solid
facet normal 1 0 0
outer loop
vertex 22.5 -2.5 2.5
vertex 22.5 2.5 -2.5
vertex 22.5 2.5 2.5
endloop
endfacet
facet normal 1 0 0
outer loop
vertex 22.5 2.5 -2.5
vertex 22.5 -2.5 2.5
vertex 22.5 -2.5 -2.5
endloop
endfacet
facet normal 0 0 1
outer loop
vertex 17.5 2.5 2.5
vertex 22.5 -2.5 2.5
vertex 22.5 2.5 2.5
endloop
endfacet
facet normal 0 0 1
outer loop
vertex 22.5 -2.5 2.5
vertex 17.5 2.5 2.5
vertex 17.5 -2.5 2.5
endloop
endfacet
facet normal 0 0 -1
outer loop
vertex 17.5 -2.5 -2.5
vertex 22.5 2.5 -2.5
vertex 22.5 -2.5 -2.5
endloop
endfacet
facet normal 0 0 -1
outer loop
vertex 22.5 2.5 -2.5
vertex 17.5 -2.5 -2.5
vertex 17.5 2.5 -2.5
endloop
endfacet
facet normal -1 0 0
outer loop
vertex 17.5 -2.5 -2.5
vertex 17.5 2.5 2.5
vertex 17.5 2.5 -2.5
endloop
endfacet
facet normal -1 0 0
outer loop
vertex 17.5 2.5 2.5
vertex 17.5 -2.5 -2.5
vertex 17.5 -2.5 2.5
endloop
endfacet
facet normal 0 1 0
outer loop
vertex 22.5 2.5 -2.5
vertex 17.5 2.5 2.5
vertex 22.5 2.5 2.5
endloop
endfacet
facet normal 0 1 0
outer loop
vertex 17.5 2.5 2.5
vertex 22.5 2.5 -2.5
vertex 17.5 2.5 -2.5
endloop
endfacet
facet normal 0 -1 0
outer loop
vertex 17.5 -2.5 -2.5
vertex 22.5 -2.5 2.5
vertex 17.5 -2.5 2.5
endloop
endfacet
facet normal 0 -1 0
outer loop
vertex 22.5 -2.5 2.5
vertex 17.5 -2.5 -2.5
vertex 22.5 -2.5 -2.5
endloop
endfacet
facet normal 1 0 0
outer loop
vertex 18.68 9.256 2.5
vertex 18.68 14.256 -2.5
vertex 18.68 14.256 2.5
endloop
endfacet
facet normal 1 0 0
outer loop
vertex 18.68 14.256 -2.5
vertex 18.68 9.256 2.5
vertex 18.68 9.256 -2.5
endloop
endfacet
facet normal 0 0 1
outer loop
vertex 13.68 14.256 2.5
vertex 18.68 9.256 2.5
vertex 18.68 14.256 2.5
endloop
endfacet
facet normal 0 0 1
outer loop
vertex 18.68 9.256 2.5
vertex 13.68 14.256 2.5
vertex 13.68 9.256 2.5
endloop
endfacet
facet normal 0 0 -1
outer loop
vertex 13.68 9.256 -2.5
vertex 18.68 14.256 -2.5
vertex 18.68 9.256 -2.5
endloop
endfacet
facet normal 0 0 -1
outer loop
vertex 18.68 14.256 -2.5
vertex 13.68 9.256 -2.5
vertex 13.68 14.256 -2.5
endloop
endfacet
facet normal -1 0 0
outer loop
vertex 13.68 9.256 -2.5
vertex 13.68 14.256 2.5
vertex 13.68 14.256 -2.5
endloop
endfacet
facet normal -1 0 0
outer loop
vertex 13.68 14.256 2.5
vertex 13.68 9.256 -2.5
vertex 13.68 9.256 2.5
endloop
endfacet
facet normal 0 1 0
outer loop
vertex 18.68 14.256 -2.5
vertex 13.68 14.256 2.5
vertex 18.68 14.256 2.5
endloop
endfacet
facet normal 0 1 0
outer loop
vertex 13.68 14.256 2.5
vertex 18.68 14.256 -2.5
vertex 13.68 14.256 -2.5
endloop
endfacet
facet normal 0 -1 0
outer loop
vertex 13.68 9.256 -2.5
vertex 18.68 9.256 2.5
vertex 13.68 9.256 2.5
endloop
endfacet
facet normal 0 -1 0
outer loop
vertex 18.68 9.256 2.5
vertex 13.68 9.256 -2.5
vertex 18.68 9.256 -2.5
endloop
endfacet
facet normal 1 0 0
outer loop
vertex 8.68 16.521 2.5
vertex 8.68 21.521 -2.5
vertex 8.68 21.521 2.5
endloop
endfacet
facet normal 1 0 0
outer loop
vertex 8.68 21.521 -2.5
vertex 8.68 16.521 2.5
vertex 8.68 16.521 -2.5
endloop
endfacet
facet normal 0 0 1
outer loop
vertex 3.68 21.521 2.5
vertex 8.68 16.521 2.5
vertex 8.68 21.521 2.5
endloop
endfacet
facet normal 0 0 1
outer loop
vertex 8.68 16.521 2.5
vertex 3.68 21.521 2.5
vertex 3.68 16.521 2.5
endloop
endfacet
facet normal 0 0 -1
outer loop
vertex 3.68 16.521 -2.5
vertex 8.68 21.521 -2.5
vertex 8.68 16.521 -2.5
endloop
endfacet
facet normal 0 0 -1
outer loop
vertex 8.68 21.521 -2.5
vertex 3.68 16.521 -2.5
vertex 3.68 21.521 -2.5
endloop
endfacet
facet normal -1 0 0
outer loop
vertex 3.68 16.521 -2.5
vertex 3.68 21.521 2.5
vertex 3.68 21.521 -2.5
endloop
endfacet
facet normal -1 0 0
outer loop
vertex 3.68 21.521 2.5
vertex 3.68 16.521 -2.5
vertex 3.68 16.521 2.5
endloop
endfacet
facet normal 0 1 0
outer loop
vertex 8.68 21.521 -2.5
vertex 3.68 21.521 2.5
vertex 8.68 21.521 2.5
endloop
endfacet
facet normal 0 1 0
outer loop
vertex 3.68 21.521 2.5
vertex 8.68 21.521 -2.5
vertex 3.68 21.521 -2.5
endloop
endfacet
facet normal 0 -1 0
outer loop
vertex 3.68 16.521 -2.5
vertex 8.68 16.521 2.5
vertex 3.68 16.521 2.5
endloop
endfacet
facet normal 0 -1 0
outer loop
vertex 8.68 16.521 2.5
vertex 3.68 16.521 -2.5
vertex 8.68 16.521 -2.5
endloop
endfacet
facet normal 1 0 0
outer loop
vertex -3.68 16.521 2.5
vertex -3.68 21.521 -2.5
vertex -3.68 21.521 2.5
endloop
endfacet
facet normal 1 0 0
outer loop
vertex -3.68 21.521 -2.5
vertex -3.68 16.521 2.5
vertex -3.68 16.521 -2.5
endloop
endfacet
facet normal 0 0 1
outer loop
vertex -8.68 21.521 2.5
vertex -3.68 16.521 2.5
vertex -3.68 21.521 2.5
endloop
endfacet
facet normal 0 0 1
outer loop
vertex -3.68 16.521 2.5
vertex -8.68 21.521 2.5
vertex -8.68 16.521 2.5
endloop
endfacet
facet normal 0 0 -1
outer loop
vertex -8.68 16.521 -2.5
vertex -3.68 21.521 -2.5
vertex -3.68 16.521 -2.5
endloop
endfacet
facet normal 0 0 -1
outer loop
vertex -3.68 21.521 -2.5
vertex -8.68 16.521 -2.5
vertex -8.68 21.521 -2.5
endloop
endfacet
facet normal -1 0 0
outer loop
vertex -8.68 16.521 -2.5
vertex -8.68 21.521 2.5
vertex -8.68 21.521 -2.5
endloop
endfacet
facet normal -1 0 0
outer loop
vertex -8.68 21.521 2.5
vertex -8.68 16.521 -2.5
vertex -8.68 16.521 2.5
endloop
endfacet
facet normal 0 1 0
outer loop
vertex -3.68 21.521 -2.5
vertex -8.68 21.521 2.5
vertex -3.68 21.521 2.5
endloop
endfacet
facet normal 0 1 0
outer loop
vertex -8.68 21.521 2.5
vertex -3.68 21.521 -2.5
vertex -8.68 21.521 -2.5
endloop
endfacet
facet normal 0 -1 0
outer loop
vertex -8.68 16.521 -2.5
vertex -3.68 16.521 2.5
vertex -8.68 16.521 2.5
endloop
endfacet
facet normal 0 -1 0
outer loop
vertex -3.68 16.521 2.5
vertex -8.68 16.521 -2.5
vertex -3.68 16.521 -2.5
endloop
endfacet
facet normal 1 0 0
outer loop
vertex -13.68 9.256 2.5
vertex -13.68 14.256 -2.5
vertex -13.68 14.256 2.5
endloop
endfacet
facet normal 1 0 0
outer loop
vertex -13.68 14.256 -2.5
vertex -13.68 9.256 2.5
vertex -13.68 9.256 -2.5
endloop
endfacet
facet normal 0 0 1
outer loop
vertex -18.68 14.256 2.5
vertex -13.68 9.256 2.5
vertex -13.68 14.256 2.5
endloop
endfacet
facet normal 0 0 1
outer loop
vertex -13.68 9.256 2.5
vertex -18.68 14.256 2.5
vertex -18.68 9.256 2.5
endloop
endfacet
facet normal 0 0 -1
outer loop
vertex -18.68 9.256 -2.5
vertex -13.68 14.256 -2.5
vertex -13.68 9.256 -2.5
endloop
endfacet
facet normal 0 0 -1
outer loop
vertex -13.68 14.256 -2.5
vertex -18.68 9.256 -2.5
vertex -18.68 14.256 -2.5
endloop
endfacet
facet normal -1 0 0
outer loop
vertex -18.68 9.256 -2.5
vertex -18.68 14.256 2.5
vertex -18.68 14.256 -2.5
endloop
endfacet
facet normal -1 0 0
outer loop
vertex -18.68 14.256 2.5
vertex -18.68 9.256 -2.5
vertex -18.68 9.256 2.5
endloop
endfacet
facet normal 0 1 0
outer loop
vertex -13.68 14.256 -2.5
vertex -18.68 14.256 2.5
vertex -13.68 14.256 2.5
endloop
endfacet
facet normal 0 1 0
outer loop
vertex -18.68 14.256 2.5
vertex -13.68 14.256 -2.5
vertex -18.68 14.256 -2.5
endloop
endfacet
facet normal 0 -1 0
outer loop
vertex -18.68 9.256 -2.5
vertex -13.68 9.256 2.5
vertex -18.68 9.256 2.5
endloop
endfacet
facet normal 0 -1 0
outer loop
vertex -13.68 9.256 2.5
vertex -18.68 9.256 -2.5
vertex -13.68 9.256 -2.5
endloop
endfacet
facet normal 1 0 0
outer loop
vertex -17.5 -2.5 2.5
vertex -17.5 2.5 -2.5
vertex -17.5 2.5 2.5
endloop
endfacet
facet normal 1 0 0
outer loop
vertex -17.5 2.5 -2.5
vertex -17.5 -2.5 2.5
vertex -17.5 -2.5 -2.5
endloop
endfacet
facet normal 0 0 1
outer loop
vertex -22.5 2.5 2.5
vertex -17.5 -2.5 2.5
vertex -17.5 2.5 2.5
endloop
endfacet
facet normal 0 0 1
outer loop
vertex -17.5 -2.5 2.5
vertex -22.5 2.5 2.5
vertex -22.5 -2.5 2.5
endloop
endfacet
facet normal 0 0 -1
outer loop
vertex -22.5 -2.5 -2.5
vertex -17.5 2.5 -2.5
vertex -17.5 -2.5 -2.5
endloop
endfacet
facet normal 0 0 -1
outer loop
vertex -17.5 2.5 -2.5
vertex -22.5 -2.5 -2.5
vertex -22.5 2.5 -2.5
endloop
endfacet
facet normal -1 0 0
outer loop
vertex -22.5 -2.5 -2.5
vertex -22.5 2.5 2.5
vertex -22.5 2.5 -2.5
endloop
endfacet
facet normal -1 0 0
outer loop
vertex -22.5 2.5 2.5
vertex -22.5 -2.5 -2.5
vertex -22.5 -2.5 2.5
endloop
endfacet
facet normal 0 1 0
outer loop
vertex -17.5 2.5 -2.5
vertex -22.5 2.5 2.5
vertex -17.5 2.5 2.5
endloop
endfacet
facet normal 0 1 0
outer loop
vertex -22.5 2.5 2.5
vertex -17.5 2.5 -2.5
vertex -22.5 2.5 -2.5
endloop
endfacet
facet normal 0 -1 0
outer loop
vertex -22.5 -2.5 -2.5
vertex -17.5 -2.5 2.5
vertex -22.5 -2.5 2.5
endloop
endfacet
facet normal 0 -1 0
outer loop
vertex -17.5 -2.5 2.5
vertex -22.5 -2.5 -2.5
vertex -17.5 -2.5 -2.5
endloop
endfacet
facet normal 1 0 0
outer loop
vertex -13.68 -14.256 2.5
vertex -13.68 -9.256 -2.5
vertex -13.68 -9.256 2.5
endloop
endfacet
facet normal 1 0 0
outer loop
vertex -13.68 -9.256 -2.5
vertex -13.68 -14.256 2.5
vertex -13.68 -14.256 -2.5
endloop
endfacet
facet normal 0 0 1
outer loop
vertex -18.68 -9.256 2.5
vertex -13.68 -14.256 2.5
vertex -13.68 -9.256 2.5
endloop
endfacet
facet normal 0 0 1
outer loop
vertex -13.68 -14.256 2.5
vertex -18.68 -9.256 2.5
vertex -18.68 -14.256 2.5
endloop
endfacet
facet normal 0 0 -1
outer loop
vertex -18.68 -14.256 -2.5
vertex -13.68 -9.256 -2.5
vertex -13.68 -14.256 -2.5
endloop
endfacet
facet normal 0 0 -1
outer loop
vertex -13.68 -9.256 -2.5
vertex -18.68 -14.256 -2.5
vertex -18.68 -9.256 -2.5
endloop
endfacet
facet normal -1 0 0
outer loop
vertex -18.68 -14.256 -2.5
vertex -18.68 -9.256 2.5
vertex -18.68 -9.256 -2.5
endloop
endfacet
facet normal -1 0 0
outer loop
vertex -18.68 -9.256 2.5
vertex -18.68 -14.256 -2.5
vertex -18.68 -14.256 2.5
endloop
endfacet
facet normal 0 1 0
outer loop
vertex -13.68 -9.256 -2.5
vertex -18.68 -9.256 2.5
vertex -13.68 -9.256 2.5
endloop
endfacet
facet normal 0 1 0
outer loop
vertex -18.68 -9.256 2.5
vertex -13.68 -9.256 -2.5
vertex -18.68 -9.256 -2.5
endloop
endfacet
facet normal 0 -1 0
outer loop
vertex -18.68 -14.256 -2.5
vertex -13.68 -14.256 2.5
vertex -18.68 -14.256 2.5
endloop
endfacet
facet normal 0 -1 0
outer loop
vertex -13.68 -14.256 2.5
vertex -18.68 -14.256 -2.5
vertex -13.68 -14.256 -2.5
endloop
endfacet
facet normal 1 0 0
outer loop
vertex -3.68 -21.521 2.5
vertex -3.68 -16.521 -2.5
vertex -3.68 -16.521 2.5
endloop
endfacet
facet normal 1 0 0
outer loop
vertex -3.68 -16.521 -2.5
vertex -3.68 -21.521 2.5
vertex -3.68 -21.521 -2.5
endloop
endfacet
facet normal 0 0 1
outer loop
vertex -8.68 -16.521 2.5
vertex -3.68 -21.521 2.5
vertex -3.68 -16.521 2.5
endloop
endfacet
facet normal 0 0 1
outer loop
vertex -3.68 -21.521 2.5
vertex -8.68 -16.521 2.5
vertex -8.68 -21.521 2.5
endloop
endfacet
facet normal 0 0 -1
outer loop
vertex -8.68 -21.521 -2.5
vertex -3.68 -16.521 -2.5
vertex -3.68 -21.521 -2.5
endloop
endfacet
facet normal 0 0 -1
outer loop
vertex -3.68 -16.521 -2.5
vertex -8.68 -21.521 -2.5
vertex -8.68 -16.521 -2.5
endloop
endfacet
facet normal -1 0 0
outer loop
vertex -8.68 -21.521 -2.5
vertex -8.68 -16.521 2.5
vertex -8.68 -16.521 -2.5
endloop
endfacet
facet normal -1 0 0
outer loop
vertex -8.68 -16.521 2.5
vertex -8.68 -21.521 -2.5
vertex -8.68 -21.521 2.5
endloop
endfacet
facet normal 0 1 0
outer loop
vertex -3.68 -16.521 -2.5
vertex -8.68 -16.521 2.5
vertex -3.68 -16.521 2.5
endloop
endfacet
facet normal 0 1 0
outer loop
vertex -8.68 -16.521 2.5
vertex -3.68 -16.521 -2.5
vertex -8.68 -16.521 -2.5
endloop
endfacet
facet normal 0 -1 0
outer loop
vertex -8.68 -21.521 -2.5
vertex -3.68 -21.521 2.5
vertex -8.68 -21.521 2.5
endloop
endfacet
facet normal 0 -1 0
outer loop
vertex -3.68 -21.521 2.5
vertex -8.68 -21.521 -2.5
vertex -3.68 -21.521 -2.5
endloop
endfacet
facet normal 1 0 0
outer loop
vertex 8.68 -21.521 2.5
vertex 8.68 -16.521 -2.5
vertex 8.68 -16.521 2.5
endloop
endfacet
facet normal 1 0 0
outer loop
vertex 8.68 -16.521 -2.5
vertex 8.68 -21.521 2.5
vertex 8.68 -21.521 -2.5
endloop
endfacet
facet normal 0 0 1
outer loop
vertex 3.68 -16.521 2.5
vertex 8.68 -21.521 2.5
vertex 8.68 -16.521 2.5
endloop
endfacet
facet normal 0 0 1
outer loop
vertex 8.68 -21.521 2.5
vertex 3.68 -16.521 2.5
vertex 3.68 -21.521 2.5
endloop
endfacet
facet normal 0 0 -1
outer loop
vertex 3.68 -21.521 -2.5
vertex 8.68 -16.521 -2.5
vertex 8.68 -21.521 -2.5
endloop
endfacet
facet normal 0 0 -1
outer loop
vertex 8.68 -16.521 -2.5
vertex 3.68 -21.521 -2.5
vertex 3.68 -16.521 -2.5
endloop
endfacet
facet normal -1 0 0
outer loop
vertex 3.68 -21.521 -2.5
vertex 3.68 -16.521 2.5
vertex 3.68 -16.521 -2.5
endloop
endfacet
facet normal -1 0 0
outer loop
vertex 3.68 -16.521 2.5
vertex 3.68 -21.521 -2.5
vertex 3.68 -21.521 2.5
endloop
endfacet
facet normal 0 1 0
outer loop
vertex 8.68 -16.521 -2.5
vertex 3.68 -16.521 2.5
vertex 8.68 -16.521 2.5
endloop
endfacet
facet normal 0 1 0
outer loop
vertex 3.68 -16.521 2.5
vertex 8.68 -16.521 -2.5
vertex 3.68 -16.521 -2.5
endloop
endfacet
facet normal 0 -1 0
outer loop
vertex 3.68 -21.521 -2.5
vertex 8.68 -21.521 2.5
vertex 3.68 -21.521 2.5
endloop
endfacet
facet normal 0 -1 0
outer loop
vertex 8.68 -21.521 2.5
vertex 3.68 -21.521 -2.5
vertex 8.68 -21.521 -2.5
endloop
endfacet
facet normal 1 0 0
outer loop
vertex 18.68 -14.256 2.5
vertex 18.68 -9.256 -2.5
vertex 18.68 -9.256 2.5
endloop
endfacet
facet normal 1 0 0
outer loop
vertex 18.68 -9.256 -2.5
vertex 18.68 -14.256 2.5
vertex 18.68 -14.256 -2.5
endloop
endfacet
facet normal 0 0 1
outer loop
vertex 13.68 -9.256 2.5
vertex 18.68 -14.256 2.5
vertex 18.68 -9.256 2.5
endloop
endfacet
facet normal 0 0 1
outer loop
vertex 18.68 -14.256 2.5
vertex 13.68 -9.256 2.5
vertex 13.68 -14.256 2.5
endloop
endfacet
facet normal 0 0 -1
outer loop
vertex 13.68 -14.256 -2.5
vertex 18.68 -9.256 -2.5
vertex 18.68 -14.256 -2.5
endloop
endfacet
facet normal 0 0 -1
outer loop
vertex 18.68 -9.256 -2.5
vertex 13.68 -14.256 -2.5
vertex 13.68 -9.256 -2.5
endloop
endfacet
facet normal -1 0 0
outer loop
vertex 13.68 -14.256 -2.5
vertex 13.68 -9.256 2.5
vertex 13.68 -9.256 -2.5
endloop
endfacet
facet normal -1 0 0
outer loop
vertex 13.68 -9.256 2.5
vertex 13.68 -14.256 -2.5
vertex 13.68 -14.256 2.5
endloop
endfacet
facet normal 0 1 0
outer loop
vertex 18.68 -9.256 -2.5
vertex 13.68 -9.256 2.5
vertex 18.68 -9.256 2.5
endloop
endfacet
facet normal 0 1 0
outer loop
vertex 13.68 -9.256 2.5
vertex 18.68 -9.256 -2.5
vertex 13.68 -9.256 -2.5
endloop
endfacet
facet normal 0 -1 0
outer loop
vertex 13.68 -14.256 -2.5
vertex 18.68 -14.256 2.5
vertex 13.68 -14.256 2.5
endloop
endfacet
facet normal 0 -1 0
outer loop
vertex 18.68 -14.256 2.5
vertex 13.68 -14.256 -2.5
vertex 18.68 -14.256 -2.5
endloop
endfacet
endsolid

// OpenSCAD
r = 20; // pattern radius
b = 5; //block size
n = 10; // number of blocks
step = 360/n;
for (i=[0:step:359]) {
    angle = i;
    dx = r*cos(angle);
    dy = r*sin(angle);
    translate([dx,dy,0])
      cube(b, center=true);
}
